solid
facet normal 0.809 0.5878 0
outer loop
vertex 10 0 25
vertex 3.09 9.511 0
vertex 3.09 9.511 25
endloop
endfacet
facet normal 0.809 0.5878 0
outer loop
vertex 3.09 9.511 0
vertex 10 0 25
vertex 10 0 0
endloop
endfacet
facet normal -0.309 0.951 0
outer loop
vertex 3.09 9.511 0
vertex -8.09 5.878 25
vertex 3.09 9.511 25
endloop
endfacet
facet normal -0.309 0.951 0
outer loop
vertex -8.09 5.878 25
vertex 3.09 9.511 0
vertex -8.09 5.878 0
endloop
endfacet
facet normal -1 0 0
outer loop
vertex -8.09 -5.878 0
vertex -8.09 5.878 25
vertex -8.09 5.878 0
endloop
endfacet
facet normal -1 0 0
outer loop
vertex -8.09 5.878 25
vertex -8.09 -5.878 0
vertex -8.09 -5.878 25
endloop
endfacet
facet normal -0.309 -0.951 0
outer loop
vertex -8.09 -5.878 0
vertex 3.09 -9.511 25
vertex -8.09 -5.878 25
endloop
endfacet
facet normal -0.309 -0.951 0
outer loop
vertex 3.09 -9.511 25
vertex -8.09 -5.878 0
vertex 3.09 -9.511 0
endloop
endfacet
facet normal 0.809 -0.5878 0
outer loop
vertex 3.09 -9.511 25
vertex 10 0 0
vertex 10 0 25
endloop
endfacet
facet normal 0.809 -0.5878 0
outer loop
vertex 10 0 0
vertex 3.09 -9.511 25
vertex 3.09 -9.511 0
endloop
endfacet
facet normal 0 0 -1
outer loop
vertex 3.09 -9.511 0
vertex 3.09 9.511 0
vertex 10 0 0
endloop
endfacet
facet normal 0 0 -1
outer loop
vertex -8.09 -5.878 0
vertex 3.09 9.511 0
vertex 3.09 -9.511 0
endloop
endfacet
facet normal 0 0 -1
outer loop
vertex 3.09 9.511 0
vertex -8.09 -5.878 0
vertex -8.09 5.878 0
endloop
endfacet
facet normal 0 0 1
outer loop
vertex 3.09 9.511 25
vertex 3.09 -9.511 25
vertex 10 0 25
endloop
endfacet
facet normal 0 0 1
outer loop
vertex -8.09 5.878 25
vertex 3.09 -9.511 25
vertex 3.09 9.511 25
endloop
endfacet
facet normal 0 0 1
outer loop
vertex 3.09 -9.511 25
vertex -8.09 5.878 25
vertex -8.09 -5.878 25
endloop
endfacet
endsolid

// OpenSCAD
// Auto-generated from tests/data/feature_fixtures_manifest.json
// fixture: prism_pentagon
// fixture_type: prism
// description: Pentagonal prism (5 sides); negative for cylinder, positive for linear_extrude_solid.
$fn = 96;

radius = 10.000000;
height = 25.000000;
sides = 5;

cylinder(r=radius, h=height, $fn=sides);
